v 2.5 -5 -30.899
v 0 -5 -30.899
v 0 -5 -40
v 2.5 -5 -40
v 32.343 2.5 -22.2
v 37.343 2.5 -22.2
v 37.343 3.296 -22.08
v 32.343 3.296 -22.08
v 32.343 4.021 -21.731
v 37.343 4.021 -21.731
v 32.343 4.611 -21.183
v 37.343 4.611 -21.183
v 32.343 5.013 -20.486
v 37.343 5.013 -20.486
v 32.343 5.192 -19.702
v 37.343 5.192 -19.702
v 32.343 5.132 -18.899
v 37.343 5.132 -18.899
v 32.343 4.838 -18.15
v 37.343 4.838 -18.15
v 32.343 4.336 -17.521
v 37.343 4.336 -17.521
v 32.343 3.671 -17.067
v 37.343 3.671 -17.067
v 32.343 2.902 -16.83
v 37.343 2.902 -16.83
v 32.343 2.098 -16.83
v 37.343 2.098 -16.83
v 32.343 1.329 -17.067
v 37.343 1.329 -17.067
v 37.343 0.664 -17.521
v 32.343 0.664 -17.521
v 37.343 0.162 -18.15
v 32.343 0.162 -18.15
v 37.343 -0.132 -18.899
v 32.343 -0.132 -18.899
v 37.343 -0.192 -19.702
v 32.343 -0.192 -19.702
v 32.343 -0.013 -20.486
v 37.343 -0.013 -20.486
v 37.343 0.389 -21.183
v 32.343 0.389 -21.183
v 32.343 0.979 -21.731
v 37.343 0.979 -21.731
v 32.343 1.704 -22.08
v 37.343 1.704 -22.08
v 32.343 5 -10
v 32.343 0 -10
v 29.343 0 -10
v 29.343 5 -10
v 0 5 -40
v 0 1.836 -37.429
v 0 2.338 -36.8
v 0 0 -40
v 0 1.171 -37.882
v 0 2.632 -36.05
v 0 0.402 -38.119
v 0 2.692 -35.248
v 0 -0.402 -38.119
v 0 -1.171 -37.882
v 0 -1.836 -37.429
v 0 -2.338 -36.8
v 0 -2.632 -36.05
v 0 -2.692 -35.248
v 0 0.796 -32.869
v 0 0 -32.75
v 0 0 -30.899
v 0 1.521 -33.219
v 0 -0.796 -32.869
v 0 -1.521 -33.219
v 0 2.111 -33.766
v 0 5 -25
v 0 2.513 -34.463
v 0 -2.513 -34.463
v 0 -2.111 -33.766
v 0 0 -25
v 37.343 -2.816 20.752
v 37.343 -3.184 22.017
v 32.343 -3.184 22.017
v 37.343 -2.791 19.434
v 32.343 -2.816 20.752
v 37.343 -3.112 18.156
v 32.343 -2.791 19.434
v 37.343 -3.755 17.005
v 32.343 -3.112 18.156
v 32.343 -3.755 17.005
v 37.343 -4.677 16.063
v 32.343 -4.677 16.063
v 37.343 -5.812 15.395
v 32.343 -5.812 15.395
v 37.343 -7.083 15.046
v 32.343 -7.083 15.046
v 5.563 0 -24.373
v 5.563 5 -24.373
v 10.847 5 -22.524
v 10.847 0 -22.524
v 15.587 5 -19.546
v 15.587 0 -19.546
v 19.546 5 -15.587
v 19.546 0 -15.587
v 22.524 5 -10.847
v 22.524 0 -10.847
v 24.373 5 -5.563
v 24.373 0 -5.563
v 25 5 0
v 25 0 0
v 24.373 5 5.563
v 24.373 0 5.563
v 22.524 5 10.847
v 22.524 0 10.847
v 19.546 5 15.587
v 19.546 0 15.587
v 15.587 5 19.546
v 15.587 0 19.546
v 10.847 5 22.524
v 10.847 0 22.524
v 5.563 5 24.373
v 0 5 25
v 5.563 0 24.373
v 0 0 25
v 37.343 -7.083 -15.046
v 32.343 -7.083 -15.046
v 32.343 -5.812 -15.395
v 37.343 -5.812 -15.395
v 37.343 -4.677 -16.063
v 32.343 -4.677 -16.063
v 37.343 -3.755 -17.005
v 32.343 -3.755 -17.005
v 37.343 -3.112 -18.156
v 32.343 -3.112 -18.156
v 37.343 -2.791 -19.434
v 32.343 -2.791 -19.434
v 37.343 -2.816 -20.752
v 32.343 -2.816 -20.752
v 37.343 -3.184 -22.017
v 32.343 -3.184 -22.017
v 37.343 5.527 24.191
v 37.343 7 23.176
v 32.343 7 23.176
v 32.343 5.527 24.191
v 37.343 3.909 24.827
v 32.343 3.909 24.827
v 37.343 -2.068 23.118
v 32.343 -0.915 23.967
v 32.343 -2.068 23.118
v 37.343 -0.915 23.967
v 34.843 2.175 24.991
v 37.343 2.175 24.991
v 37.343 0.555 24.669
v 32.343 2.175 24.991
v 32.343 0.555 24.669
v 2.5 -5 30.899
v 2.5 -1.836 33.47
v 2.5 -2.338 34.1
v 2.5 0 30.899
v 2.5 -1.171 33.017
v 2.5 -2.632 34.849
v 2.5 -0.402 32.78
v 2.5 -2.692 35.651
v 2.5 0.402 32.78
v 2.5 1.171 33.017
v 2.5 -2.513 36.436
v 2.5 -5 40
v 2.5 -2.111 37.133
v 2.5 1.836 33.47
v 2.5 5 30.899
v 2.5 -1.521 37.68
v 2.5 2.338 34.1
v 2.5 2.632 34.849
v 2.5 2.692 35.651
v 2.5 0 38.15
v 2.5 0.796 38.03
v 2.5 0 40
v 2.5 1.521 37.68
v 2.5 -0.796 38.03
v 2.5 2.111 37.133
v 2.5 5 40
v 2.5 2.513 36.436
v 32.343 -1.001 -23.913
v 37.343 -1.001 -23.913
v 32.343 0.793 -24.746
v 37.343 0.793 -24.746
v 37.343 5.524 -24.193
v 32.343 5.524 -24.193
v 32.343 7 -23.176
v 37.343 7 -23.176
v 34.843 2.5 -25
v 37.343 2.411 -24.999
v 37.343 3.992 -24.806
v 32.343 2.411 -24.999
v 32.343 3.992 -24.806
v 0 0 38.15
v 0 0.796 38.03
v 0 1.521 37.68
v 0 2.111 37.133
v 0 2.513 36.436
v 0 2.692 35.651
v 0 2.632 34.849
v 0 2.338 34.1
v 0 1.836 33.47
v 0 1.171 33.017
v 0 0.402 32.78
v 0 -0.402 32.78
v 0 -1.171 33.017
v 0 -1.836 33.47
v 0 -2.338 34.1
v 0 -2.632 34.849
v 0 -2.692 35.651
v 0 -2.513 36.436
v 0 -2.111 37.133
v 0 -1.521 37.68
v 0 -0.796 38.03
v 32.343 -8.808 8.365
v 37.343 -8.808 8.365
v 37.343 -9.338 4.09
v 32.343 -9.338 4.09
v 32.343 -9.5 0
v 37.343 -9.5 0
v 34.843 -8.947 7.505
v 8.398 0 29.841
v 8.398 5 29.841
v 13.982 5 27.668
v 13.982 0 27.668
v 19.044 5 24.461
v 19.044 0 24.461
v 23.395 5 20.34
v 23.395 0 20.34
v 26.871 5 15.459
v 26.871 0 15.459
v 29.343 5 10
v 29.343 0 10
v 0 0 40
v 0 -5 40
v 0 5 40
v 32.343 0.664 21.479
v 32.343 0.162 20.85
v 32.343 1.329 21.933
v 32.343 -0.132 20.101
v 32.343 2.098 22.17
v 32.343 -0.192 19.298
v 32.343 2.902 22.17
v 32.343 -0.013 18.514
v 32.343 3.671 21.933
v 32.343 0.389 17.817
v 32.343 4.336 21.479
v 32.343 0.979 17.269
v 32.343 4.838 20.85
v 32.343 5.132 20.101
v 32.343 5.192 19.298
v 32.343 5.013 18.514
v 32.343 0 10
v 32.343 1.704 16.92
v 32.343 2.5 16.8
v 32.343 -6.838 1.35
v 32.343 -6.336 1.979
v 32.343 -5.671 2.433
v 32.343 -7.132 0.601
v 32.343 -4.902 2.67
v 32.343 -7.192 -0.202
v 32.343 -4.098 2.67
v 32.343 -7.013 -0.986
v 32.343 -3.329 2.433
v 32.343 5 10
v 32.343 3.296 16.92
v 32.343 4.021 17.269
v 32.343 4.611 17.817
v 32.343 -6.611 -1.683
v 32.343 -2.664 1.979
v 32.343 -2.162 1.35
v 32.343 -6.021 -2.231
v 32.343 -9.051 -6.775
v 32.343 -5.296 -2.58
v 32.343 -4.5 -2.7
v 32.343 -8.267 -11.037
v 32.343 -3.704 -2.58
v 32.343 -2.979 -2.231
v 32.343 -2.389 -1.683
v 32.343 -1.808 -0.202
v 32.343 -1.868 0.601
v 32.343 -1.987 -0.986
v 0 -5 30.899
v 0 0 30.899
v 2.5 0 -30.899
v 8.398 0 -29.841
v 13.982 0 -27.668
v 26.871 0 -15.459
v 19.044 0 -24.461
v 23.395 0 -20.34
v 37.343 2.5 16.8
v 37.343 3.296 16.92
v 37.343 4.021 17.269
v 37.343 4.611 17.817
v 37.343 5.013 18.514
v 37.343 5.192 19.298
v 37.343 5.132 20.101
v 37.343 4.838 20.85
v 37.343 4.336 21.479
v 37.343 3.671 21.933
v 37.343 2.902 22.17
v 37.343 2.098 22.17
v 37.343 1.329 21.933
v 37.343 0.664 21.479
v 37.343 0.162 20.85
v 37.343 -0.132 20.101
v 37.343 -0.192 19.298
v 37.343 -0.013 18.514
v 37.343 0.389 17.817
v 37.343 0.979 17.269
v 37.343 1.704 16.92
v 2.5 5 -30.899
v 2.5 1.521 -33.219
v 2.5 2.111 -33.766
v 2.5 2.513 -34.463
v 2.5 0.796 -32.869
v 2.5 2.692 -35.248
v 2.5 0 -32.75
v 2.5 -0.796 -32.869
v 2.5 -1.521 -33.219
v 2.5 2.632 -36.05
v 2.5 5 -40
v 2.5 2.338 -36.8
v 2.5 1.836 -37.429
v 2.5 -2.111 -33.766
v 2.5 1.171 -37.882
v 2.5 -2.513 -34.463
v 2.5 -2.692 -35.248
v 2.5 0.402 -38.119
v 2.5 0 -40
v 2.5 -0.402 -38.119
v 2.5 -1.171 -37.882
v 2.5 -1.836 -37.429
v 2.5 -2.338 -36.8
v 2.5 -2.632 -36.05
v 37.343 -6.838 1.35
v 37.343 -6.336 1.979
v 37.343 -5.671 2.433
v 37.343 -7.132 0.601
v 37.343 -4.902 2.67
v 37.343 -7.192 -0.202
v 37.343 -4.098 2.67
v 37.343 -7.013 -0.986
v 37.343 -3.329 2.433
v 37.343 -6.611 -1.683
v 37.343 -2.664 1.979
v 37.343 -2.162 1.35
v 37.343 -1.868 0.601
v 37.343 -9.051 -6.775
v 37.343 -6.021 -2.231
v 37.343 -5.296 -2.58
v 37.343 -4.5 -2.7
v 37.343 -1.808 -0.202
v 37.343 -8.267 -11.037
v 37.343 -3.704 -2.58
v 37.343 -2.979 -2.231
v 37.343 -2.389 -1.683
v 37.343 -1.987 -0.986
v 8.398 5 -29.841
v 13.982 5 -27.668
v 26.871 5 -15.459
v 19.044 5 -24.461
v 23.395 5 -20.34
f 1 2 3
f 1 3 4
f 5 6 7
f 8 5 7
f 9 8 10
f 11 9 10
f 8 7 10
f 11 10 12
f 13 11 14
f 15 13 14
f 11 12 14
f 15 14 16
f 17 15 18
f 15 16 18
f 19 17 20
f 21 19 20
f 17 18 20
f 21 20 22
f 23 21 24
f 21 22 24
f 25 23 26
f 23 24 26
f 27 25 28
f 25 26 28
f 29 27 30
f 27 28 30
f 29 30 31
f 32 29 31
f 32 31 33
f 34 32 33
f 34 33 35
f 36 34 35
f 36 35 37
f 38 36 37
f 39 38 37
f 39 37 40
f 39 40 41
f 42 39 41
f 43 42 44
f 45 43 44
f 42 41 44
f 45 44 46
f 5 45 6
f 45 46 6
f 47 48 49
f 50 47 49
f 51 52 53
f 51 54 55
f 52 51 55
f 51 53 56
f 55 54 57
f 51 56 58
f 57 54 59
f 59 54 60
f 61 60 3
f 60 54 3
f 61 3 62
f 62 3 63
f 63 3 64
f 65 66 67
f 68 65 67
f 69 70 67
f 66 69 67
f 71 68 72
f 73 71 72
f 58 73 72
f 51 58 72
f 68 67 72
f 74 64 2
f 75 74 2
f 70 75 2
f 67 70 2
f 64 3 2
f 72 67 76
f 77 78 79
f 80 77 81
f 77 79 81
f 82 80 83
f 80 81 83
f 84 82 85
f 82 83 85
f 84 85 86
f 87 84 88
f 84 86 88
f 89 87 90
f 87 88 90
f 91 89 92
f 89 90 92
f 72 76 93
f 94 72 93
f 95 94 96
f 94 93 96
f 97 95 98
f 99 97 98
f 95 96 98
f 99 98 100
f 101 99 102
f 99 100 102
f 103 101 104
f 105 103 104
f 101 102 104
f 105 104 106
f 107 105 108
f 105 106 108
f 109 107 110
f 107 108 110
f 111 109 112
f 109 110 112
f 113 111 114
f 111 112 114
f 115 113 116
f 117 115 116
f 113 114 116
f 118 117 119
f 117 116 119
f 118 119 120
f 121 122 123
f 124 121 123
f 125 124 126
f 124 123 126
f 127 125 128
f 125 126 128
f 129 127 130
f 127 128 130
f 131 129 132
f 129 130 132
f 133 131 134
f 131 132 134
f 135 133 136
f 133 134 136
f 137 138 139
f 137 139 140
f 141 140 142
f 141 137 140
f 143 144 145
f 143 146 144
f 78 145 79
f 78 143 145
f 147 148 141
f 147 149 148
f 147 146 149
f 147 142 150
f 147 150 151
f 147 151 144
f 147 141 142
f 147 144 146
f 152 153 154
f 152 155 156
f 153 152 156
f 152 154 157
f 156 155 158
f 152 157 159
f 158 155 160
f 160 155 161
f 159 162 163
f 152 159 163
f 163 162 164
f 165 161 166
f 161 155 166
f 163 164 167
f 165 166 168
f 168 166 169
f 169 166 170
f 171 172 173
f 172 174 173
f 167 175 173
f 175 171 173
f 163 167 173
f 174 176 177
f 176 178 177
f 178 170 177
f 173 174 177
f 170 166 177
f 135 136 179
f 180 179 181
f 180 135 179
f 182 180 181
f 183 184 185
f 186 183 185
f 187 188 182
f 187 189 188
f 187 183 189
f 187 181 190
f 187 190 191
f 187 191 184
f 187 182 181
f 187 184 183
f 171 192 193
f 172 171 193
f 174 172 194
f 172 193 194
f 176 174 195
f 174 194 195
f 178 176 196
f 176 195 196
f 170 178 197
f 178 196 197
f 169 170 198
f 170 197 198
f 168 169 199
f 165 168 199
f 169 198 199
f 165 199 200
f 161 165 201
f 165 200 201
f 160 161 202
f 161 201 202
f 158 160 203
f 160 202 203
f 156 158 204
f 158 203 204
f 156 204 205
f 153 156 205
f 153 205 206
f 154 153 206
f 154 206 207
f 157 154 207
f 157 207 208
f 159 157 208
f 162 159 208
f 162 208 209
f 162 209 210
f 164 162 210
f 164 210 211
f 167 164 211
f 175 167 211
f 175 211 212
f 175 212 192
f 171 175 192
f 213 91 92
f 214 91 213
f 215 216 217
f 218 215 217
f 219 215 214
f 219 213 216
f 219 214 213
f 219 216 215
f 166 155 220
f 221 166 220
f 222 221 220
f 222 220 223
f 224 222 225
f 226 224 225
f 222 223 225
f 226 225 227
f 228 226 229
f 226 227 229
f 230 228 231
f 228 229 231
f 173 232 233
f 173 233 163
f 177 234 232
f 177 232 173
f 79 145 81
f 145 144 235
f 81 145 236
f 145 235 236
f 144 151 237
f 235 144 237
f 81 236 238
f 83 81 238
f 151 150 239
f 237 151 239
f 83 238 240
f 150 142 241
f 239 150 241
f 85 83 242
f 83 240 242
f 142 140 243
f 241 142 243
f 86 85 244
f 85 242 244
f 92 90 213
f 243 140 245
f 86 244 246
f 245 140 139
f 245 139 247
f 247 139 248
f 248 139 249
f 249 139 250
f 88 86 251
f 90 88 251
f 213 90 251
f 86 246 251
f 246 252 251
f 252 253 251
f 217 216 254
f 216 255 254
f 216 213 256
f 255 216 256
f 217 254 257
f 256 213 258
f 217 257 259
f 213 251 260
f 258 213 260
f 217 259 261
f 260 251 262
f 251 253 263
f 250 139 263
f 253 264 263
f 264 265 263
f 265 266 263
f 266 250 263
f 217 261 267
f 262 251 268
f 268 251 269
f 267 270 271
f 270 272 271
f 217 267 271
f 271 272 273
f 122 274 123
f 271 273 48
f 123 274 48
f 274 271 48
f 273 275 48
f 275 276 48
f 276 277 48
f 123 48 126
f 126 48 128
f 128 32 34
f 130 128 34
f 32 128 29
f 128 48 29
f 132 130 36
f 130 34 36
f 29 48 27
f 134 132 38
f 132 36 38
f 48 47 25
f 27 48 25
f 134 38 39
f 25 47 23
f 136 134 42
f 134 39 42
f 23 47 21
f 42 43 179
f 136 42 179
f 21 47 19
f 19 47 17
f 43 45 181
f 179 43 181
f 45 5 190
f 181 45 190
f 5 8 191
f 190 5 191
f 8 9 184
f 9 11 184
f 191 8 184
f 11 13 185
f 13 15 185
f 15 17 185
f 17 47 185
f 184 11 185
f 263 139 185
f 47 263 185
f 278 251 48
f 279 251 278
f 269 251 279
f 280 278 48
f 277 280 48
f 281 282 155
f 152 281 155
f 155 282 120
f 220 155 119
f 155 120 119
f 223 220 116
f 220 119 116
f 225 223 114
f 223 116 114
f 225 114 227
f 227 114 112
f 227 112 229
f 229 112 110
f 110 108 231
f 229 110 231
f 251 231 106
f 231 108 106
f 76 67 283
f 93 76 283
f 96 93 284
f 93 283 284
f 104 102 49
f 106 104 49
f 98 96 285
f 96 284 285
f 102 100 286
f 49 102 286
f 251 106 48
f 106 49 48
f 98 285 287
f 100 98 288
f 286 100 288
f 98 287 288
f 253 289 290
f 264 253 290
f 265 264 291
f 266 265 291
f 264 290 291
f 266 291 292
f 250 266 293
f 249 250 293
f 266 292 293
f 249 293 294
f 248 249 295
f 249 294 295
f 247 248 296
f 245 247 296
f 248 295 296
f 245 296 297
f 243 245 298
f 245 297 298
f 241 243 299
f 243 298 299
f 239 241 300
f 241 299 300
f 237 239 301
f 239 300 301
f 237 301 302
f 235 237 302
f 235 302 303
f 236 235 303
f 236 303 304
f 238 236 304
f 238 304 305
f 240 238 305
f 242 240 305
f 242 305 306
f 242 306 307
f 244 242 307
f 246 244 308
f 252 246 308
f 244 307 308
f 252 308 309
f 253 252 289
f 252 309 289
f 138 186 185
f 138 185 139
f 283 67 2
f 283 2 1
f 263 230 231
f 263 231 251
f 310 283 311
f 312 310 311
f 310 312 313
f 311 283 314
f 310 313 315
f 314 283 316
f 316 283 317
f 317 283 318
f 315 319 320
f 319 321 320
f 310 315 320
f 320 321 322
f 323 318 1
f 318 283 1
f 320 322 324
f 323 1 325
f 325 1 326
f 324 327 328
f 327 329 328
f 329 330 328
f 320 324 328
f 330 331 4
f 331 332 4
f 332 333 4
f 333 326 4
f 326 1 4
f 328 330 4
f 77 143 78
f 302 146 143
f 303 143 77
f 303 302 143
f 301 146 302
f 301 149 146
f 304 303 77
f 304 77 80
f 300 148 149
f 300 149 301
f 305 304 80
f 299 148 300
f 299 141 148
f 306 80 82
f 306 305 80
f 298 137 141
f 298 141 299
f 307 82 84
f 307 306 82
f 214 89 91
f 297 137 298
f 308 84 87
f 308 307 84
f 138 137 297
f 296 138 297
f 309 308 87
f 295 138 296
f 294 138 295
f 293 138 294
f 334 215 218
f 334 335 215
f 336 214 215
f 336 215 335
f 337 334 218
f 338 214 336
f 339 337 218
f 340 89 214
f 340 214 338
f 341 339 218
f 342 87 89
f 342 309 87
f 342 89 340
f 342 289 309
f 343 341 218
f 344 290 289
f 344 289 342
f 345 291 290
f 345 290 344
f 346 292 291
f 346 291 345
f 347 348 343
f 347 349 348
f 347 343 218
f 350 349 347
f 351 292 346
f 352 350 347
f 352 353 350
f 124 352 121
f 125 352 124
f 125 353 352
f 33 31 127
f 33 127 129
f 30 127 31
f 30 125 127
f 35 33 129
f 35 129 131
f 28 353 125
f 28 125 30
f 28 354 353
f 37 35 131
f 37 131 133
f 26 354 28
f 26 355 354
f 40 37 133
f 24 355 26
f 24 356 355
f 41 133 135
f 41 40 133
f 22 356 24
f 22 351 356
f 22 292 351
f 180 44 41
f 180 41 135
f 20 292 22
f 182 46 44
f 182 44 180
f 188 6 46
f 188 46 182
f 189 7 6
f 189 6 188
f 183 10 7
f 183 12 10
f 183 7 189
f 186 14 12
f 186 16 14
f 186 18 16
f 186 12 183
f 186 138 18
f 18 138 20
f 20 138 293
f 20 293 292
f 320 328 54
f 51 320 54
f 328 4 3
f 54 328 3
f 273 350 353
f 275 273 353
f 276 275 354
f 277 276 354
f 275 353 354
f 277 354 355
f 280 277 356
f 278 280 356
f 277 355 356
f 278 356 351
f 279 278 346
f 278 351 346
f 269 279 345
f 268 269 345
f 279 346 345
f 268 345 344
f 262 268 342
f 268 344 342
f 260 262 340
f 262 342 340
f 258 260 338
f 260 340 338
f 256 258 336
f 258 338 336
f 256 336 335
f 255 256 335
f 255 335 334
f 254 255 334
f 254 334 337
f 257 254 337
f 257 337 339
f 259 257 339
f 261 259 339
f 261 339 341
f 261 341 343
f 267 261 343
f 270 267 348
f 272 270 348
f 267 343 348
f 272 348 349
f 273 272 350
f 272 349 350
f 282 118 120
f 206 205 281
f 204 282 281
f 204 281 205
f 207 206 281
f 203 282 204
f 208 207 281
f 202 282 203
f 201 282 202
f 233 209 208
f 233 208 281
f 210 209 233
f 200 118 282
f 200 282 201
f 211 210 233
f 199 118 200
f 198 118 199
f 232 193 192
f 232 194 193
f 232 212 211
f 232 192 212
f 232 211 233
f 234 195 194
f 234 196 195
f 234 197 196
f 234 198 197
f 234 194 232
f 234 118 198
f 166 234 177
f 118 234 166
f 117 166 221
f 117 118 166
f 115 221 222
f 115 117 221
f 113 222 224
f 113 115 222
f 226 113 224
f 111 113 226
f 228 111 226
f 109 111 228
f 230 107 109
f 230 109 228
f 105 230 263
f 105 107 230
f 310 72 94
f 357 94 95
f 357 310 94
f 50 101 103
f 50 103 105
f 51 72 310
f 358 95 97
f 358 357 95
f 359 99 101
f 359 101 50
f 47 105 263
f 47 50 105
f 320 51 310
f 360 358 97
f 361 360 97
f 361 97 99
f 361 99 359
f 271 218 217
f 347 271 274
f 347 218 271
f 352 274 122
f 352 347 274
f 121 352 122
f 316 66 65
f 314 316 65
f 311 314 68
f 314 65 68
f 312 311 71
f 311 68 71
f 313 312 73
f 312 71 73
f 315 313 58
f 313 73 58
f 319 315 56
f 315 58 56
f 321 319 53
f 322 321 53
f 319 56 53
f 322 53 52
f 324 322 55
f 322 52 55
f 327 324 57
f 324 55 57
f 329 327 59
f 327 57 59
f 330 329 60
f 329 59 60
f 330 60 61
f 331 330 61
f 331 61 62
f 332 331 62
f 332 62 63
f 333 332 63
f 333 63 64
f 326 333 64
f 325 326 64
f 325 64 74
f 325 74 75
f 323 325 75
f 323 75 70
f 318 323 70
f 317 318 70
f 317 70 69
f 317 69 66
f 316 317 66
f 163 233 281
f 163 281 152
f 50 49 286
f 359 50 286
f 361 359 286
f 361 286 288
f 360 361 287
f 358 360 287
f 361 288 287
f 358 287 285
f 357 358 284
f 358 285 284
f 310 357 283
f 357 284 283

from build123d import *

# Parameters (mm, degrees)
BOSS_EXTRUDE1_DEPTH = 5
SKETCH2_W           = 2.5
SKETCH2_H           = 9.100970889
BOSS_EXTRUDE2_DEPTH = 5
CUT_EXTRUDE1_REACH  = 56.95
SKETCH3_R           = 2.7
SKETCH4_W           = 20
SKETCH4_H           = 5
SKETCH4_R           = 2.7
BOSS_EXTRUDE3_DEPTH = 5
SKETCH5_R           = 5
CUT_EXTRUDE2_DEPTH  = 10


with BuildPart() as part:
    # Sketch1 → Boss-Extrude1 (new body)
    with BuildSketch(Plane(origin=(0, 0, 0), x_dir=(1, 0, 0), z_dir=(0, 1, 0))):
        with BuildLine():
            Line((0, -25), (0, -40))
            Line((0, -40), (2.5, -40))
            Line((2.5, -40), (2.5, -30.899029111))
            ThreePointArc((2.5, -30.899029111), (19.044247329, -24.460511926), (29.342801502, -10))
            Line((29.342801502, -10), (37.342801502, -10))
            Line((37.342801502, -10), (37.342801502, 10))
            Line((37.342801502, 10), (29.342801502, 10))
            ThreePointArc((29.342801502, 10), (19.044247329, 24.460511926), (2.5, 30.899029111))
            Line((2.5, 30.899029111), (2.5, 40))
            Line((2.5, 40), (0, 40))
            Line((0, 40), (0, 25))
            ThreePointArc((0, 25), (25, 0), (0, -25))
        make_face()
    extrude(amount=BOSS_EXTRUDE1_DEPTH)

    # Sketch2 → Boss-Extrude2 (add)
    with BuildSketch(Plane.XZ):
        with Locations((1.25, 35.449514556)):
            Rectangle(SKETCH2_W, SKETCH2_H)
        with Locations((1.25, -35.449514556)):
            Rectangle(SKETCH2_W, SKETCH2_H)
    extrude(amount=BOSS_EXTRUDE2_DEPTH)

    # Sketch3 → Cut-Extrude1 (cut, up to next)
    with BuildSketch(Plane.ZY, mode=Mode.PRIVATE) as cut_extrude1_sk1:
        with Locations((-35.449514555, 0)):
            Circle(SKETCH3_R)
    cut_extrude1_tool1 = extrude(cut_extrude1_sk1.sketch, amount=-CUT_EXTRUDE1_REACH, mode=Mode.PRIVATE) & part.part
    # Sketch3 → Cut-Extrude1 (cut, up to next)
    with BuildSketch(Plane.ZY, mode=Mode.PRIVATE) as cut_extrude1_sk2:
        with Locations((35.449514555, 0)):
            Circle(SKETCH3_R)
    cut_extrude1_tool2 = extrude(cut_extrude1_sk2.sketch, amount=-CUT_EXTRUDE1_REACH, mode=Mode.PRIVATE) & part.part
    add(cut_extrude1_tool1.solids().sort_by_distance((0, 0, -35.449515))[0], mode=Mode.SUBTRACT)
    add(cut_extrude1_tool2.solids().sort_by_distance((0, 0, 35.449515))[0], mode=Mode.SUBTRACT)

    # Sketch4 → Boss-Extrude3 (add)
    with BuildSketch(Plane(origin=(37.342801502, 0, 0), x_dir=(0, 0, -1), z_dir=(1, 0, 0))):
        with BuildLine():
            add(Edge.make_bspline(
                [(-23.175620272, 7), (-37.080992454, -9.500000022), (3e-08, -9.5)],
                knots=[2.757195879, 2.757195879, 2.757195879, 4.712388982, 4.712388982, 4.712388982], degree=2, weights=[1, 0.559016994, 1]))
            add(Edge.make_bspline(
                [(3e-08, -9.5), (25, -9.499999986), (25, 2.5)],
                knots=[4.712388982, 4.712388982, 4.712388982, 6.283185307, 6.283185307, 6.283185307], degree=2, weights=[1, 0.707106782, 1]))
            add(Edge.make_bspline(
                [(25, 2.5), (25, 4.835206052), (23.175620272, 7)],
                knots=[0, 0, 0, 0.384396774, 0.384396774, 0.384396774], degree=2, weights=[1, 0.981586677, 1]))
            Line((23.175620272, 7), (-23.175620272, 7))
        make_face()
        with Locations((0, 2.5)):
            Rectangle(SKETCH4_W, SKETCH4_H, mode=Mode.SUBTRACT)
        with Locations((-19.5, 2.5)):
            Circle(SKETCH4_R, mode=Mode.SUBTRACT)
        with Locations((19.5, 2.5)):
            Circle(SKETCH4_R, mode=Mode.SUBTRACT)
        with Locations((0, -4.5)):
            Circle(SKETCH4_R, mode=Mode.SUBTRACT)
    extrude(amount=-BOSS_EXTRUDE3_DEPTH)

    # Sketch5 → Cut-Extrude2 (cut)
    with BuildSketch(Plane.ZY.offset(-32.342801502)):
        with Locations((-20, -7.759289568)):
            Circle(SKETCH5_R)
        with Locations((20, -7.759289568)):
            Circle(SKETCH5_R)
    extrude(amount=-CUT_EXTRUDE2_DEPTH, mode=Mode.SUBTRACT)


solid = part.part
